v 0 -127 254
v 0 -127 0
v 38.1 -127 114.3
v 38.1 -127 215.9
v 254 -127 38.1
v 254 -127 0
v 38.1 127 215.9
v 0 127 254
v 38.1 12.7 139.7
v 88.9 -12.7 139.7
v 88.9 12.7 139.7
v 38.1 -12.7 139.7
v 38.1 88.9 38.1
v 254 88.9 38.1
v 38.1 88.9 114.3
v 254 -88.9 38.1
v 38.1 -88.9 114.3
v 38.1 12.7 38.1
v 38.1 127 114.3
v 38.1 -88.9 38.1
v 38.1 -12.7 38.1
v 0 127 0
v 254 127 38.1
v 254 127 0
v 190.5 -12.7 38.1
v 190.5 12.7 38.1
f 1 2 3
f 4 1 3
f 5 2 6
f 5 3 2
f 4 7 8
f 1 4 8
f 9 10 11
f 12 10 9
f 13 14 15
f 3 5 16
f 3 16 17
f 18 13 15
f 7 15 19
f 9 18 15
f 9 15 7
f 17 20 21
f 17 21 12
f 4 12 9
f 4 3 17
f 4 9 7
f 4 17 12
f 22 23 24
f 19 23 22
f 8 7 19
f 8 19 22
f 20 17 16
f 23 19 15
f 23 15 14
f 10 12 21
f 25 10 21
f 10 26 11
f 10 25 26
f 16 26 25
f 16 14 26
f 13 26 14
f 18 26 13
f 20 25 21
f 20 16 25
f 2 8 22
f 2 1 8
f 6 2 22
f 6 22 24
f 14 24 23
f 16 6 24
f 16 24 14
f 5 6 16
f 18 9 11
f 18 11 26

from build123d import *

# Parameters (mm, degrees)
F1_DEPTH = 127
F2_DEPTH = 12.7
F4_DEPTH = 38.1
F6_DEPTH = 38.1


with BuildPart() as f1:
    # F0 (on Front) → F1 (new body, symmetric)
    with BuildSketch(Plane.XZ):
        Polygon((0, 254), (0, 0), (254, 0), (254, 38.1), (190.5, 38.1), (38.1, 38.1), (38.1, 139.7), (38.1, 215.9), align=None)
    extrude(amount=F1_DEPTH, both=True)

    # F0 (on Front) → F2 (join, symmetric)
    with BuildSketch(Plane.XZ):
        Polygon((88.9, 139.7), (38.1, 139.7), (38.1, 38.1), (190.5, 38.1), align=None)
    extrude(amount=F2_DEPTH, both=True)

    # F3 (on face) → F4 (join)
    with BuildSketch(Plane.XZ.offset(127)):
        Polygon((254, 38.1), (38.1, 114.3), (38.1, 38.1), align=None)
    extrude(amount=-F4_DEPTH)

    # F5 (on face) → F6 (join)
    with BuildSketch(Plane(origin=(0, 127, 0), x_dir=(-1, 0, 0), z_dir=(0, 1, 0))):
        Polygon((-38.1, 38.1), (-38.1, 114.3), (-254, 38.1), align=None)
    extrude(amount=-F6_DEPTH)


solid = f1.part
